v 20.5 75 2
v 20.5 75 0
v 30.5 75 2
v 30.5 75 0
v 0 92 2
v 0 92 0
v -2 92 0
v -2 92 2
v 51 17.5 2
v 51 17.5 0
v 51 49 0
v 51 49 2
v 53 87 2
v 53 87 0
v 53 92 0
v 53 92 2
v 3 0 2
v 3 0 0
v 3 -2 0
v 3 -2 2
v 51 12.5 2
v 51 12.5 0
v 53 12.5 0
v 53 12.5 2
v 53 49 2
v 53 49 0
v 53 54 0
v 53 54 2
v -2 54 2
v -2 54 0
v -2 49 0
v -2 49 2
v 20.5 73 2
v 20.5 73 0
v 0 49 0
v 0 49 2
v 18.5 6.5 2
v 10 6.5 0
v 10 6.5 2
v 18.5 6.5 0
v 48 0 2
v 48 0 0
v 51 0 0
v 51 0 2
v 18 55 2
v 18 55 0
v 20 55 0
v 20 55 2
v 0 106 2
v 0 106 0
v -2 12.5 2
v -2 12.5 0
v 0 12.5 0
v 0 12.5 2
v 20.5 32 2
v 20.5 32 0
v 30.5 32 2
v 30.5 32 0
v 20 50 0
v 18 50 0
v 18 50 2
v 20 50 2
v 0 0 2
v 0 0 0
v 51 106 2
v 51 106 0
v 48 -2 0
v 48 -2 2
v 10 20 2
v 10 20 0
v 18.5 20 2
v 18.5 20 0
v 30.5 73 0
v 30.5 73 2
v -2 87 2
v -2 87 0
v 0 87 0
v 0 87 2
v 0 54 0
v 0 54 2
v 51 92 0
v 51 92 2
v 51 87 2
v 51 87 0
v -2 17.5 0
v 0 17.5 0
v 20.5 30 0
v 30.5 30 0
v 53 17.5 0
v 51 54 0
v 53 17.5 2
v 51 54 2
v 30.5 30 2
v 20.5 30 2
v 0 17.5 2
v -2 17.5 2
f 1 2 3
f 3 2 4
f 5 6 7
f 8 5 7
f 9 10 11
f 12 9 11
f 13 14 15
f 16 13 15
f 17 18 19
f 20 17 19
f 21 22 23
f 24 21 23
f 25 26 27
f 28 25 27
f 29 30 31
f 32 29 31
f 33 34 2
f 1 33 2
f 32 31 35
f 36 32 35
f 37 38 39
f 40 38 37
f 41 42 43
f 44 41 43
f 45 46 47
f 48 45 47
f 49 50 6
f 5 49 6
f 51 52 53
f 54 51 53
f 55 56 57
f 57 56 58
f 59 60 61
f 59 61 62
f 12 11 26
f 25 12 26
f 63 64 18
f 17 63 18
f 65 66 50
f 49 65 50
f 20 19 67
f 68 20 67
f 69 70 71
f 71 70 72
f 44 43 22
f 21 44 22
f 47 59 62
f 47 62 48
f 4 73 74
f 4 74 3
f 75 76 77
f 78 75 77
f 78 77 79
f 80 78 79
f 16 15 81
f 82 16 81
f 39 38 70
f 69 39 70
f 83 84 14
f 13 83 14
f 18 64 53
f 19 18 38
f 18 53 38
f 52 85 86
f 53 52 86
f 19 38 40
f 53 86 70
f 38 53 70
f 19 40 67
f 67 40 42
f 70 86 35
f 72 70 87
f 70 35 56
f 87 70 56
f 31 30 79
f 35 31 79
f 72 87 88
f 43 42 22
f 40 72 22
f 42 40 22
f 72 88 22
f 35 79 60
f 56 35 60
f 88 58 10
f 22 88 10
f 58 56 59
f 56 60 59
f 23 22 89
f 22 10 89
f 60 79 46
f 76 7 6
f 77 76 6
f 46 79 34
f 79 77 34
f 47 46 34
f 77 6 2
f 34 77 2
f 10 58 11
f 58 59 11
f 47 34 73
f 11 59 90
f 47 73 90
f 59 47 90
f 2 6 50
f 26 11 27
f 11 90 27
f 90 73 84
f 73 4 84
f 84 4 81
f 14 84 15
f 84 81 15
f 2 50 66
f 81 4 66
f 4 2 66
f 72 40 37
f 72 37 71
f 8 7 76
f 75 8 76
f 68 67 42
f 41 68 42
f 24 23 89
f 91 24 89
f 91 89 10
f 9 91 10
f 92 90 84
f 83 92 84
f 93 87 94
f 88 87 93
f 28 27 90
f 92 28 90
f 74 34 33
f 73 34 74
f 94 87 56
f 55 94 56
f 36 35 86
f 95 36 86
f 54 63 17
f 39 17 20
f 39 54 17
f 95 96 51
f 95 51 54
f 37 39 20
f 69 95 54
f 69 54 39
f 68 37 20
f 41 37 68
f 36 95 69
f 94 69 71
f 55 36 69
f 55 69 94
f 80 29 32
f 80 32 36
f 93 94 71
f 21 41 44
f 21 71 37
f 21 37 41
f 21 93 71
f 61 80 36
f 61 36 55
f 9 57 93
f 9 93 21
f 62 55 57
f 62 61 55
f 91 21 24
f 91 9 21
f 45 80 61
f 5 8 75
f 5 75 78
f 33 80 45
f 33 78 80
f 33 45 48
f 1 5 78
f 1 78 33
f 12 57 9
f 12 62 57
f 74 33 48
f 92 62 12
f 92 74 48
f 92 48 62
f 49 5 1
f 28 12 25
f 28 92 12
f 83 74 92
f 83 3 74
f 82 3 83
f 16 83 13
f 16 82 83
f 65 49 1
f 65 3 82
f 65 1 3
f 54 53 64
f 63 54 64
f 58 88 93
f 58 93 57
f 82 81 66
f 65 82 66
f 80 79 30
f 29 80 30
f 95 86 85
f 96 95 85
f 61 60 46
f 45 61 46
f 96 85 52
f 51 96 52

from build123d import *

# Parameters (mm, degrees)
SKETCH1_W           = 10
SKETCH1_H           = 2
SKETCH1_W_2         = 2
SKETCH1_H_2         = 5
SKETCH1_W_3         = 8.5
SKETCH1_H_3         = 13.5
BOSS_EXTRUDE1_DEPTH = 2


with BuildPart() as part:
    # Sketch1 → Boss-Extrude1 (new body)
    with BuildSketch(Plane.XY):
        Polygon((0, 0), (3, 0), (3, -2), (48, -2), (48, 0), (51, 0), (51, 12.5), (53, 12.5), (53, 17.5), (51, 17.5), (51, 49), (53, 49), (53, 54), (51, 54), (51, 87), (53, 87), (53, 92), (51, 92), (51, 106), (0, 106), (0, 92), (-2, 92), (-2, 87), (0, 87), (0, 54), (-2, 54), (-2, 49), (0, 49), (0, 17.5), (-2, 17.5), (-2, 12.5), (0, 12.5), align=None)
        with Locations((25.5, 31)):
            Rectangle(SKETCH1_W, SKETCH1_H, mode=Mode.SUBTRACT)
        with Locations((25.5, 74)):
            Rectangle(SKETCH1_W, SKETCH1_H, mode=Mode.SUBTRACT)
        with Locations((19, 52.5)):
            Rectangle(SKETCH1_W_2, SKETCH1_H_2, mode=Mode.SUBTRACT)
        with Locations((14.25, 13.25)):
            Rectangle(SKETCH1_W_3, SKETCH1_H_3, mode=Mode.SUBTRACT)
    extrude(amount=BOSS_EXTRUDE1_DEPTH)


solid = part.part
